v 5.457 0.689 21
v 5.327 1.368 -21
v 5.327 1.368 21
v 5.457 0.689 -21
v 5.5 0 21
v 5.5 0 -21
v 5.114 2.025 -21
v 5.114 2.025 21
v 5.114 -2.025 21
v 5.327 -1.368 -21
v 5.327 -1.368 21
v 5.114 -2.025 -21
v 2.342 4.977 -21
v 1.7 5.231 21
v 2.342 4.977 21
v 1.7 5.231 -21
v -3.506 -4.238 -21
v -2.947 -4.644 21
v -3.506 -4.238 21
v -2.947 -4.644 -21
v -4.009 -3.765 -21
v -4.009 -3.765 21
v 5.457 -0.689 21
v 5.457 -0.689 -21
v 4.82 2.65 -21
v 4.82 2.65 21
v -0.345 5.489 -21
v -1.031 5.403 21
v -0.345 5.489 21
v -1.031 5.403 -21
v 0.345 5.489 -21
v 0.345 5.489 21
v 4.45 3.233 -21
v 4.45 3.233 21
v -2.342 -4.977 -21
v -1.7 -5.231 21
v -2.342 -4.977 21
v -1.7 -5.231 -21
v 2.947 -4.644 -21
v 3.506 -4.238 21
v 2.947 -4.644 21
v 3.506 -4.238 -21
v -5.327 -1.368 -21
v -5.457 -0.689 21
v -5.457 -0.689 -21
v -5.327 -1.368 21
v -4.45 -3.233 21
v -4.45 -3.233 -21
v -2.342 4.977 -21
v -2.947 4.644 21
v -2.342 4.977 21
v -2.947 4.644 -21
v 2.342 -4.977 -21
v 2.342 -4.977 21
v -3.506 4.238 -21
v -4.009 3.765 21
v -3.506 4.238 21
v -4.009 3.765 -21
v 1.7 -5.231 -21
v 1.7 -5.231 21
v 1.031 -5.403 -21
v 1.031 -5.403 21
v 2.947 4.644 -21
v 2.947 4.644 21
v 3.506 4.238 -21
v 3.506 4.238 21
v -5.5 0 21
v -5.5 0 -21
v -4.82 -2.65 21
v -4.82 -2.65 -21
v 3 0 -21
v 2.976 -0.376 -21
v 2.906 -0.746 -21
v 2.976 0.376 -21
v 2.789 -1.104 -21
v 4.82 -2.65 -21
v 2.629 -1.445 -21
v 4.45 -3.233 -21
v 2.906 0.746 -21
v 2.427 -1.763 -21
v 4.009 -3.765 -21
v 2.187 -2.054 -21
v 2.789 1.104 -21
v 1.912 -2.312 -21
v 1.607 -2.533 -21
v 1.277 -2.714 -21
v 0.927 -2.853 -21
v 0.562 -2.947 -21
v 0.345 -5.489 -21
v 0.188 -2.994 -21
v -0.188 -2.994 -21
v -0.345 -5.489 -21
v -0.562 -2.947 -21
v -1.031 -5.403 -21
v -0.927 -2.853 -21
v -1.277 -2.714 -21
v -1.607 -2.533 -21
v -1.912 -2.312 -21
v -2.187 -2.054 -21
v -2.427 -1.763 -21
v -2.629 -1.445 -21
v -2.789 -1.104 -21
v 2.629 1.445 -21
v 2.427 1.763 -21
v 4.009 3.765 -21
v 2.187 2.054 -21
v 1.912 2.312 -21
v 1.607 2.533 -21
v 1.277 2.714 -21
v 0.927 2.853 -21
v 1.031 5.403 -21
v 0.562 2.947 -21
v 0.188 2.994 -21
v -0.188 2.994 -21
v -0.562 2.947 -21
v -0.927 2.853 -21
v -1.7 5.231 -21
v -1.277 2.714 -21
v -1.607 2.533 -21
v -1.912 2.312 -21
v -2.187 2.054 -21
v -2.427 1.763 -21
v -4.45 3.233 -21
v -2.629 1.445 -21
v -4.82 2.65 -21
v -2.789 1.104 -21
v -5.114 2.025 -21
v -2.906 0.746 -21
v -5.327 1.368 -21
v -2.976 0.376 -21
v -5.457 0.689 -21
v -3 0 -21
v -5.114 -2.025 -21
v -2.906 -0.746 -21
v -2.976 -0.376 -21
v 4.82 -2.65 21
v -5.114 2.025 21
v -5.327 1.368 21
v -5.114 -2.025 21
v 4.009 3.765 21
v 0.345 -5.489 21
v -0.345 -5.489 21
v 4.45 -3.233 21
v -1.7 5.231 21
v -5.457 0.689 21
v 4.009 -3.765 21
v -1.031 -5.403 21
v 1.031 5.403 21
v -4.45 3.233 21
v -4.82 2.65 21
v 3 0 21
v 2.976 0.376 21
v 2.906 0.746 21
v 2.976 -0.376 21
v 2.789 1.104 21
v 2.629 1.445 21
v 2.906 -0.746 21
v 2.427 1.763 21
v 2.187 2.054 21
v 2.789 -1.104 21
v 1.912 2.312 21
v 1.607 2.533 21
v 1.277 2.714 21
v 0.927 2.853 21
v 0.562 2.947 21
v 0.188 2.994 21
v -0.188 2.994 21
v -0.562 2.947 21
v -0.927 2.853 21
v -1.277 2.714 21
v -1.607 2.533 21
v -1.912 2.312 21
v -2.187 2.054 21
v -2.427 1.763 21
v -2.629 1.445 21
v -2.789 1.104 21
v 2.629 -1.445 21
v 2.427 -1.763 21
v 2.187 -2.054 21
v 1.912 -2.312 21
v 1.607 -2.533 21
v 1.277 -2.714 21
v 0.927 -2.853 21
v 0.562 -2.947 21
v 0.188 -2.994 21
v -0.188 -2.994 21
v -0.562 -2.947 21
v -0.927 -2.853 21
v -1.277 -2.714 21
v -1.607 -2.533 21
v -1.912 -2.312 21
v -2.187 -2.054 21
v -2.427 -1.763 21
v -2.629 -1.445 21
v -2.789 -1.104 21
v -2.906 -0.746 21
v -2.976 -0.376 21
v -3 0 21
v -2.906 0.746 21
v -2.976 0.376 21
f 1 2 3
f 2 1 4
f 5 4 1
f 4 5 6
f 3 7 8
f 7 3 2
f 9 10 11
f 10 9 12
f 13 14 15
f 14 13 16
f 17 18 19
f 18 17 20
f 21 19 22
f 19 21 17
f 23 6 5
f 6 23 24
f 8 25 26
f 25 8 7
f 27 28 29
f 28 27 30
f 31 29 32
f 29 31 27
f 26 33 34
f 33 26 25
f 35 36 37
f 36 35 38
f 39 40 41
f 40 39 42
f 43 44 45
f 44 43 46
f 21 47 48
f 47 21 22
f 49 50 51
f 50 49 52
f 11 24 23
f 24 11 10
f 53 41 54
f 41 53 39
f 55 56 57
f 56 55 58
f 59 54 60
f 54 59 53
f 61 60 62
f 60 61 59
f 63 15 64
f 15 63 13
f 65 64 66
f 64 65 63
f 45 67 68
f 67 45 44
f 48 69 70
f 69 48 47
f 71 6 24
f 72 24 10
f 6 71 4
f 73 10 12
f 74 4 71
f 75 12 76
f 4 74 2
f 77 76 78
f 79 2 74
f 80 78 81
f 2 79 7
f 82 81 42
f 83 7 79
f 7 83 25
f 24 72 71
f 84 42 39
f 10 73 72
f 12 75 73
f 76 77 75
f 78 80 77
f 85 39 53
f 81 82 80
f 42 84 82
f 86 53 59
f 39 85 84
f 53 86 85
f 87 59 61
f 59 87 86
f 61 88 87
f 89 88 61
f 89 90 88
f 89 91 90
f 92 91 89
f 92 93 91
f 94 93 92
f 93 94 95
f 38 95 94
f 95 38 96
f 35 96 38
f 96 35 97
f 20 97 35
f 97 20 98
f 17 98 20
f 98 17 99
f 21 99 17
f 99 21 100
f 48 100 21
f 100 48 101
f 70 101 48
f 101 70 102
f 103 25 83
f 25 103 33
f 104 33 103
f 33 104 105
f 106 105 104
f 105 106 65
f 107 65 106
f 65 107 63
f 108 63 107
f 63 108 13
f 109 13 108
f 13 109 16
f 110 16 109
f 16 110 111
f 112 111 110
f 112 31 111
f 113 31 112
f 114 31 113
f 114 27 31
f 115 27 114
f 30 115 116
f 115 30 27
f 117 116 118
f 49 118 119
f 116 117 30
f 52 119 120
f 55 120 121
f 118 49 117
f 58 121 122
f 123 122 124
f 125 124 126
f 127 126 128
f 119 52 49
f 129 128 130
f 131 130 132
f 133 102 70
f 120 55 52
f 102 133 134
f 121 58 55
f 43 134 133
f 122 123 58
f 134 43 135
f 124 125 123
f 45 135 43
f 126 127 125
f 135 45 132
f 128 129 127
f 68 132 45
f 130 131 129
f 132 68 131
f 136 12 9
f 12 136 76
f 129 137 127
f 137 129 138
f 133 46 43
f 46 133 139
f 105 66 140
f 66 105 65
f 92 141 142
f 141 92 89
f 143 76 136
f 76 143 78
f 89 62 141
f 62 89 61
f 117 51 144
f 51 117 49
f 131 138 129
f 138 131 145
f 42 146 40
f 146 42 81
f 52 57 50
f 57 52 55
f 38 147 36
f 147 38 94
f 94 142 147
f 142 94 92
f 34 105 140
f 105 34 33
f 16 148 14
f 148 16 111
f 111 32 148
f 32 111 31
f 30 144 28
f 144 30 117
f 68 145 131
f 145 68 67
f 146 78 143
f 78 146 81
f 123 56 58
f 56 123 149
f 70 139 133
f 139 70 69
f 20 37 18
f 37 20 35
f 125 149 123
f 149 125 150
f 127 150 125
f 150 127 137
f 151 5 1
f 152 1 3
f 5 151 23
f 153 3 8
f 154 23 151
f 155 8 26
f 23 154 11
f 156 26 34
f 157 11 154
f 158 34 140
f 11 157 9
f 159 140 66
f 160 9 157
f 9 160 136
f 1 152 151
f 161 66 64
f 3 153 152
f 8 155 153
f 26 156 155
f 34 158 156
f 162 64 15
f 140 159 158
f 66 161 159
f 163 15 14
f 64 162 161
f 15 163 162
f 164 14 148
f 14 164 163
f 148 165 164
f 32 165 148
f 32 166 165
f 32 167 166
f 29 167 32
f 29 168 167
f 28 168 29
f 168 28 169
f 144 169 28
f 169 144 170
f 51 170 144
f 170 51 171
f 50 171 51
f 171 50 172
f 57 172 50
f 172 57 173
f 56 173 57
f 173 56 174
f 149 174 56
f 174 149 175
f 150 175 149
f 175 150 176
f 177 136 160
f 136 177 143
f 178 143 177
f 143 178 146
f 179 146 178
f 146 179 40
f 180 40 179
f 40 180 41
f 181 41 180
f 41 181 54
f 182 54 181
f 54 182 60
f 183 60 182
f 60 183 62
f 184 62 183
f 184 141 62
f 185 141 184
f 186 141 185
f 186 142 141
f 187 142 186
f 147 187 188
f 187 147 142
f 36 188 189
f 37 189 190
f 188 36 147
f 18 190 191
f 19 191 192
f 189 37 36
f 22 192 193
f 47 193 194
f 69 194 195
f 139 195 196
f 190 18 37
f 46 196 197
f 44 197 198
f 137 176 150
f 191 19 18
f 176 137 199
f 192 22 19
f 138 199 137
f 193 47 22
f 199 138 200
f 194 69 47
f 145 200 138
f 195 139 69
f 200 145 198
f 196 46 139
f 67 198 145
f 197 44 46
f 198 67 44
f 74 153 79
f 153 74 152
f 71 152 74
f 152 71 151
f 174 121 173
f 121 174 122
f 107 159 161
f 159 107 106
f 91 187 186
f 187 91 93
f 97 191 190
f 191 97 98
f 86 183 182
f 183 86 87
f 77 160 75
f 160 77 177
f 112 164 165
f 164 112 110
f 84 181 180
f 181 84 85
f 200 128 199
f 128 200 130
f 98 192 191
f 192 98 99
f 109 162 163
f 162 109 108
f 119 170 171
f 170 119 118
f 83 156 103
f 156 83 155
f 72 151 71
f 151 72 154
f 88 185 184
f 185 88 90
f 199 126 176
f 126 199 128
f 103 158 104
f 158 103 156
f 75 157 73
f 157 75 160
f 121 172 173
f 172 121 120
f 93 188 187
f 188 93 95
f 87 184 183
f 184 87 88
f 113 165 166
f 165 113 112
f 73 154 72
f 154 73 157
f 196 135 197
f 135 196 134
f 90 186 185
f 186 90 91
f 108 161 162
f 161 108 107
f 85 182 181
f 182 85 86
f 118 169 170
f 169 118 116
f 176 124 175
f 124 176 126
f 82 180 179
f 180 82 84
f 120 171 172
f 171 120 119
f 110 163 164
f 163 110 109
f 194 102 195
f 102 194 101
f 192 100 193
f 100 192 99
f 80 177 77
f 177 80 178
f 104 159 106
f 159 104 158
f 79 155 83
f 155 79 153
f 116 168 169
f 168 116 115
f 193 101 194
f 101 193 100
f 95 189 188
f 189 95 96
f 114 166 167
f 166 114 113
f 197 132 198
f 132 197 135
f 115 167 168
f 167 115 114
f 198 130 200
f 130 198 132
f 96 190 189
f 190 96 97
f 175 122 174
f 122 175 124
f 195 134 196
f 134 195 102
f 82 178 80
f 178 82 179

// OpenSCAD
$fn = 50;


difference() {
	union() {
		translate(v = [0, 0, -21.0000000000]) {
			cylinder(h = 42, r = 5.5000000000);
		}
	}
	union() {
		translate(v = [0, 0, -100.0000000000]) {
			cylinder(h = 200, r = 3.0000000000);
		}
	}
}
